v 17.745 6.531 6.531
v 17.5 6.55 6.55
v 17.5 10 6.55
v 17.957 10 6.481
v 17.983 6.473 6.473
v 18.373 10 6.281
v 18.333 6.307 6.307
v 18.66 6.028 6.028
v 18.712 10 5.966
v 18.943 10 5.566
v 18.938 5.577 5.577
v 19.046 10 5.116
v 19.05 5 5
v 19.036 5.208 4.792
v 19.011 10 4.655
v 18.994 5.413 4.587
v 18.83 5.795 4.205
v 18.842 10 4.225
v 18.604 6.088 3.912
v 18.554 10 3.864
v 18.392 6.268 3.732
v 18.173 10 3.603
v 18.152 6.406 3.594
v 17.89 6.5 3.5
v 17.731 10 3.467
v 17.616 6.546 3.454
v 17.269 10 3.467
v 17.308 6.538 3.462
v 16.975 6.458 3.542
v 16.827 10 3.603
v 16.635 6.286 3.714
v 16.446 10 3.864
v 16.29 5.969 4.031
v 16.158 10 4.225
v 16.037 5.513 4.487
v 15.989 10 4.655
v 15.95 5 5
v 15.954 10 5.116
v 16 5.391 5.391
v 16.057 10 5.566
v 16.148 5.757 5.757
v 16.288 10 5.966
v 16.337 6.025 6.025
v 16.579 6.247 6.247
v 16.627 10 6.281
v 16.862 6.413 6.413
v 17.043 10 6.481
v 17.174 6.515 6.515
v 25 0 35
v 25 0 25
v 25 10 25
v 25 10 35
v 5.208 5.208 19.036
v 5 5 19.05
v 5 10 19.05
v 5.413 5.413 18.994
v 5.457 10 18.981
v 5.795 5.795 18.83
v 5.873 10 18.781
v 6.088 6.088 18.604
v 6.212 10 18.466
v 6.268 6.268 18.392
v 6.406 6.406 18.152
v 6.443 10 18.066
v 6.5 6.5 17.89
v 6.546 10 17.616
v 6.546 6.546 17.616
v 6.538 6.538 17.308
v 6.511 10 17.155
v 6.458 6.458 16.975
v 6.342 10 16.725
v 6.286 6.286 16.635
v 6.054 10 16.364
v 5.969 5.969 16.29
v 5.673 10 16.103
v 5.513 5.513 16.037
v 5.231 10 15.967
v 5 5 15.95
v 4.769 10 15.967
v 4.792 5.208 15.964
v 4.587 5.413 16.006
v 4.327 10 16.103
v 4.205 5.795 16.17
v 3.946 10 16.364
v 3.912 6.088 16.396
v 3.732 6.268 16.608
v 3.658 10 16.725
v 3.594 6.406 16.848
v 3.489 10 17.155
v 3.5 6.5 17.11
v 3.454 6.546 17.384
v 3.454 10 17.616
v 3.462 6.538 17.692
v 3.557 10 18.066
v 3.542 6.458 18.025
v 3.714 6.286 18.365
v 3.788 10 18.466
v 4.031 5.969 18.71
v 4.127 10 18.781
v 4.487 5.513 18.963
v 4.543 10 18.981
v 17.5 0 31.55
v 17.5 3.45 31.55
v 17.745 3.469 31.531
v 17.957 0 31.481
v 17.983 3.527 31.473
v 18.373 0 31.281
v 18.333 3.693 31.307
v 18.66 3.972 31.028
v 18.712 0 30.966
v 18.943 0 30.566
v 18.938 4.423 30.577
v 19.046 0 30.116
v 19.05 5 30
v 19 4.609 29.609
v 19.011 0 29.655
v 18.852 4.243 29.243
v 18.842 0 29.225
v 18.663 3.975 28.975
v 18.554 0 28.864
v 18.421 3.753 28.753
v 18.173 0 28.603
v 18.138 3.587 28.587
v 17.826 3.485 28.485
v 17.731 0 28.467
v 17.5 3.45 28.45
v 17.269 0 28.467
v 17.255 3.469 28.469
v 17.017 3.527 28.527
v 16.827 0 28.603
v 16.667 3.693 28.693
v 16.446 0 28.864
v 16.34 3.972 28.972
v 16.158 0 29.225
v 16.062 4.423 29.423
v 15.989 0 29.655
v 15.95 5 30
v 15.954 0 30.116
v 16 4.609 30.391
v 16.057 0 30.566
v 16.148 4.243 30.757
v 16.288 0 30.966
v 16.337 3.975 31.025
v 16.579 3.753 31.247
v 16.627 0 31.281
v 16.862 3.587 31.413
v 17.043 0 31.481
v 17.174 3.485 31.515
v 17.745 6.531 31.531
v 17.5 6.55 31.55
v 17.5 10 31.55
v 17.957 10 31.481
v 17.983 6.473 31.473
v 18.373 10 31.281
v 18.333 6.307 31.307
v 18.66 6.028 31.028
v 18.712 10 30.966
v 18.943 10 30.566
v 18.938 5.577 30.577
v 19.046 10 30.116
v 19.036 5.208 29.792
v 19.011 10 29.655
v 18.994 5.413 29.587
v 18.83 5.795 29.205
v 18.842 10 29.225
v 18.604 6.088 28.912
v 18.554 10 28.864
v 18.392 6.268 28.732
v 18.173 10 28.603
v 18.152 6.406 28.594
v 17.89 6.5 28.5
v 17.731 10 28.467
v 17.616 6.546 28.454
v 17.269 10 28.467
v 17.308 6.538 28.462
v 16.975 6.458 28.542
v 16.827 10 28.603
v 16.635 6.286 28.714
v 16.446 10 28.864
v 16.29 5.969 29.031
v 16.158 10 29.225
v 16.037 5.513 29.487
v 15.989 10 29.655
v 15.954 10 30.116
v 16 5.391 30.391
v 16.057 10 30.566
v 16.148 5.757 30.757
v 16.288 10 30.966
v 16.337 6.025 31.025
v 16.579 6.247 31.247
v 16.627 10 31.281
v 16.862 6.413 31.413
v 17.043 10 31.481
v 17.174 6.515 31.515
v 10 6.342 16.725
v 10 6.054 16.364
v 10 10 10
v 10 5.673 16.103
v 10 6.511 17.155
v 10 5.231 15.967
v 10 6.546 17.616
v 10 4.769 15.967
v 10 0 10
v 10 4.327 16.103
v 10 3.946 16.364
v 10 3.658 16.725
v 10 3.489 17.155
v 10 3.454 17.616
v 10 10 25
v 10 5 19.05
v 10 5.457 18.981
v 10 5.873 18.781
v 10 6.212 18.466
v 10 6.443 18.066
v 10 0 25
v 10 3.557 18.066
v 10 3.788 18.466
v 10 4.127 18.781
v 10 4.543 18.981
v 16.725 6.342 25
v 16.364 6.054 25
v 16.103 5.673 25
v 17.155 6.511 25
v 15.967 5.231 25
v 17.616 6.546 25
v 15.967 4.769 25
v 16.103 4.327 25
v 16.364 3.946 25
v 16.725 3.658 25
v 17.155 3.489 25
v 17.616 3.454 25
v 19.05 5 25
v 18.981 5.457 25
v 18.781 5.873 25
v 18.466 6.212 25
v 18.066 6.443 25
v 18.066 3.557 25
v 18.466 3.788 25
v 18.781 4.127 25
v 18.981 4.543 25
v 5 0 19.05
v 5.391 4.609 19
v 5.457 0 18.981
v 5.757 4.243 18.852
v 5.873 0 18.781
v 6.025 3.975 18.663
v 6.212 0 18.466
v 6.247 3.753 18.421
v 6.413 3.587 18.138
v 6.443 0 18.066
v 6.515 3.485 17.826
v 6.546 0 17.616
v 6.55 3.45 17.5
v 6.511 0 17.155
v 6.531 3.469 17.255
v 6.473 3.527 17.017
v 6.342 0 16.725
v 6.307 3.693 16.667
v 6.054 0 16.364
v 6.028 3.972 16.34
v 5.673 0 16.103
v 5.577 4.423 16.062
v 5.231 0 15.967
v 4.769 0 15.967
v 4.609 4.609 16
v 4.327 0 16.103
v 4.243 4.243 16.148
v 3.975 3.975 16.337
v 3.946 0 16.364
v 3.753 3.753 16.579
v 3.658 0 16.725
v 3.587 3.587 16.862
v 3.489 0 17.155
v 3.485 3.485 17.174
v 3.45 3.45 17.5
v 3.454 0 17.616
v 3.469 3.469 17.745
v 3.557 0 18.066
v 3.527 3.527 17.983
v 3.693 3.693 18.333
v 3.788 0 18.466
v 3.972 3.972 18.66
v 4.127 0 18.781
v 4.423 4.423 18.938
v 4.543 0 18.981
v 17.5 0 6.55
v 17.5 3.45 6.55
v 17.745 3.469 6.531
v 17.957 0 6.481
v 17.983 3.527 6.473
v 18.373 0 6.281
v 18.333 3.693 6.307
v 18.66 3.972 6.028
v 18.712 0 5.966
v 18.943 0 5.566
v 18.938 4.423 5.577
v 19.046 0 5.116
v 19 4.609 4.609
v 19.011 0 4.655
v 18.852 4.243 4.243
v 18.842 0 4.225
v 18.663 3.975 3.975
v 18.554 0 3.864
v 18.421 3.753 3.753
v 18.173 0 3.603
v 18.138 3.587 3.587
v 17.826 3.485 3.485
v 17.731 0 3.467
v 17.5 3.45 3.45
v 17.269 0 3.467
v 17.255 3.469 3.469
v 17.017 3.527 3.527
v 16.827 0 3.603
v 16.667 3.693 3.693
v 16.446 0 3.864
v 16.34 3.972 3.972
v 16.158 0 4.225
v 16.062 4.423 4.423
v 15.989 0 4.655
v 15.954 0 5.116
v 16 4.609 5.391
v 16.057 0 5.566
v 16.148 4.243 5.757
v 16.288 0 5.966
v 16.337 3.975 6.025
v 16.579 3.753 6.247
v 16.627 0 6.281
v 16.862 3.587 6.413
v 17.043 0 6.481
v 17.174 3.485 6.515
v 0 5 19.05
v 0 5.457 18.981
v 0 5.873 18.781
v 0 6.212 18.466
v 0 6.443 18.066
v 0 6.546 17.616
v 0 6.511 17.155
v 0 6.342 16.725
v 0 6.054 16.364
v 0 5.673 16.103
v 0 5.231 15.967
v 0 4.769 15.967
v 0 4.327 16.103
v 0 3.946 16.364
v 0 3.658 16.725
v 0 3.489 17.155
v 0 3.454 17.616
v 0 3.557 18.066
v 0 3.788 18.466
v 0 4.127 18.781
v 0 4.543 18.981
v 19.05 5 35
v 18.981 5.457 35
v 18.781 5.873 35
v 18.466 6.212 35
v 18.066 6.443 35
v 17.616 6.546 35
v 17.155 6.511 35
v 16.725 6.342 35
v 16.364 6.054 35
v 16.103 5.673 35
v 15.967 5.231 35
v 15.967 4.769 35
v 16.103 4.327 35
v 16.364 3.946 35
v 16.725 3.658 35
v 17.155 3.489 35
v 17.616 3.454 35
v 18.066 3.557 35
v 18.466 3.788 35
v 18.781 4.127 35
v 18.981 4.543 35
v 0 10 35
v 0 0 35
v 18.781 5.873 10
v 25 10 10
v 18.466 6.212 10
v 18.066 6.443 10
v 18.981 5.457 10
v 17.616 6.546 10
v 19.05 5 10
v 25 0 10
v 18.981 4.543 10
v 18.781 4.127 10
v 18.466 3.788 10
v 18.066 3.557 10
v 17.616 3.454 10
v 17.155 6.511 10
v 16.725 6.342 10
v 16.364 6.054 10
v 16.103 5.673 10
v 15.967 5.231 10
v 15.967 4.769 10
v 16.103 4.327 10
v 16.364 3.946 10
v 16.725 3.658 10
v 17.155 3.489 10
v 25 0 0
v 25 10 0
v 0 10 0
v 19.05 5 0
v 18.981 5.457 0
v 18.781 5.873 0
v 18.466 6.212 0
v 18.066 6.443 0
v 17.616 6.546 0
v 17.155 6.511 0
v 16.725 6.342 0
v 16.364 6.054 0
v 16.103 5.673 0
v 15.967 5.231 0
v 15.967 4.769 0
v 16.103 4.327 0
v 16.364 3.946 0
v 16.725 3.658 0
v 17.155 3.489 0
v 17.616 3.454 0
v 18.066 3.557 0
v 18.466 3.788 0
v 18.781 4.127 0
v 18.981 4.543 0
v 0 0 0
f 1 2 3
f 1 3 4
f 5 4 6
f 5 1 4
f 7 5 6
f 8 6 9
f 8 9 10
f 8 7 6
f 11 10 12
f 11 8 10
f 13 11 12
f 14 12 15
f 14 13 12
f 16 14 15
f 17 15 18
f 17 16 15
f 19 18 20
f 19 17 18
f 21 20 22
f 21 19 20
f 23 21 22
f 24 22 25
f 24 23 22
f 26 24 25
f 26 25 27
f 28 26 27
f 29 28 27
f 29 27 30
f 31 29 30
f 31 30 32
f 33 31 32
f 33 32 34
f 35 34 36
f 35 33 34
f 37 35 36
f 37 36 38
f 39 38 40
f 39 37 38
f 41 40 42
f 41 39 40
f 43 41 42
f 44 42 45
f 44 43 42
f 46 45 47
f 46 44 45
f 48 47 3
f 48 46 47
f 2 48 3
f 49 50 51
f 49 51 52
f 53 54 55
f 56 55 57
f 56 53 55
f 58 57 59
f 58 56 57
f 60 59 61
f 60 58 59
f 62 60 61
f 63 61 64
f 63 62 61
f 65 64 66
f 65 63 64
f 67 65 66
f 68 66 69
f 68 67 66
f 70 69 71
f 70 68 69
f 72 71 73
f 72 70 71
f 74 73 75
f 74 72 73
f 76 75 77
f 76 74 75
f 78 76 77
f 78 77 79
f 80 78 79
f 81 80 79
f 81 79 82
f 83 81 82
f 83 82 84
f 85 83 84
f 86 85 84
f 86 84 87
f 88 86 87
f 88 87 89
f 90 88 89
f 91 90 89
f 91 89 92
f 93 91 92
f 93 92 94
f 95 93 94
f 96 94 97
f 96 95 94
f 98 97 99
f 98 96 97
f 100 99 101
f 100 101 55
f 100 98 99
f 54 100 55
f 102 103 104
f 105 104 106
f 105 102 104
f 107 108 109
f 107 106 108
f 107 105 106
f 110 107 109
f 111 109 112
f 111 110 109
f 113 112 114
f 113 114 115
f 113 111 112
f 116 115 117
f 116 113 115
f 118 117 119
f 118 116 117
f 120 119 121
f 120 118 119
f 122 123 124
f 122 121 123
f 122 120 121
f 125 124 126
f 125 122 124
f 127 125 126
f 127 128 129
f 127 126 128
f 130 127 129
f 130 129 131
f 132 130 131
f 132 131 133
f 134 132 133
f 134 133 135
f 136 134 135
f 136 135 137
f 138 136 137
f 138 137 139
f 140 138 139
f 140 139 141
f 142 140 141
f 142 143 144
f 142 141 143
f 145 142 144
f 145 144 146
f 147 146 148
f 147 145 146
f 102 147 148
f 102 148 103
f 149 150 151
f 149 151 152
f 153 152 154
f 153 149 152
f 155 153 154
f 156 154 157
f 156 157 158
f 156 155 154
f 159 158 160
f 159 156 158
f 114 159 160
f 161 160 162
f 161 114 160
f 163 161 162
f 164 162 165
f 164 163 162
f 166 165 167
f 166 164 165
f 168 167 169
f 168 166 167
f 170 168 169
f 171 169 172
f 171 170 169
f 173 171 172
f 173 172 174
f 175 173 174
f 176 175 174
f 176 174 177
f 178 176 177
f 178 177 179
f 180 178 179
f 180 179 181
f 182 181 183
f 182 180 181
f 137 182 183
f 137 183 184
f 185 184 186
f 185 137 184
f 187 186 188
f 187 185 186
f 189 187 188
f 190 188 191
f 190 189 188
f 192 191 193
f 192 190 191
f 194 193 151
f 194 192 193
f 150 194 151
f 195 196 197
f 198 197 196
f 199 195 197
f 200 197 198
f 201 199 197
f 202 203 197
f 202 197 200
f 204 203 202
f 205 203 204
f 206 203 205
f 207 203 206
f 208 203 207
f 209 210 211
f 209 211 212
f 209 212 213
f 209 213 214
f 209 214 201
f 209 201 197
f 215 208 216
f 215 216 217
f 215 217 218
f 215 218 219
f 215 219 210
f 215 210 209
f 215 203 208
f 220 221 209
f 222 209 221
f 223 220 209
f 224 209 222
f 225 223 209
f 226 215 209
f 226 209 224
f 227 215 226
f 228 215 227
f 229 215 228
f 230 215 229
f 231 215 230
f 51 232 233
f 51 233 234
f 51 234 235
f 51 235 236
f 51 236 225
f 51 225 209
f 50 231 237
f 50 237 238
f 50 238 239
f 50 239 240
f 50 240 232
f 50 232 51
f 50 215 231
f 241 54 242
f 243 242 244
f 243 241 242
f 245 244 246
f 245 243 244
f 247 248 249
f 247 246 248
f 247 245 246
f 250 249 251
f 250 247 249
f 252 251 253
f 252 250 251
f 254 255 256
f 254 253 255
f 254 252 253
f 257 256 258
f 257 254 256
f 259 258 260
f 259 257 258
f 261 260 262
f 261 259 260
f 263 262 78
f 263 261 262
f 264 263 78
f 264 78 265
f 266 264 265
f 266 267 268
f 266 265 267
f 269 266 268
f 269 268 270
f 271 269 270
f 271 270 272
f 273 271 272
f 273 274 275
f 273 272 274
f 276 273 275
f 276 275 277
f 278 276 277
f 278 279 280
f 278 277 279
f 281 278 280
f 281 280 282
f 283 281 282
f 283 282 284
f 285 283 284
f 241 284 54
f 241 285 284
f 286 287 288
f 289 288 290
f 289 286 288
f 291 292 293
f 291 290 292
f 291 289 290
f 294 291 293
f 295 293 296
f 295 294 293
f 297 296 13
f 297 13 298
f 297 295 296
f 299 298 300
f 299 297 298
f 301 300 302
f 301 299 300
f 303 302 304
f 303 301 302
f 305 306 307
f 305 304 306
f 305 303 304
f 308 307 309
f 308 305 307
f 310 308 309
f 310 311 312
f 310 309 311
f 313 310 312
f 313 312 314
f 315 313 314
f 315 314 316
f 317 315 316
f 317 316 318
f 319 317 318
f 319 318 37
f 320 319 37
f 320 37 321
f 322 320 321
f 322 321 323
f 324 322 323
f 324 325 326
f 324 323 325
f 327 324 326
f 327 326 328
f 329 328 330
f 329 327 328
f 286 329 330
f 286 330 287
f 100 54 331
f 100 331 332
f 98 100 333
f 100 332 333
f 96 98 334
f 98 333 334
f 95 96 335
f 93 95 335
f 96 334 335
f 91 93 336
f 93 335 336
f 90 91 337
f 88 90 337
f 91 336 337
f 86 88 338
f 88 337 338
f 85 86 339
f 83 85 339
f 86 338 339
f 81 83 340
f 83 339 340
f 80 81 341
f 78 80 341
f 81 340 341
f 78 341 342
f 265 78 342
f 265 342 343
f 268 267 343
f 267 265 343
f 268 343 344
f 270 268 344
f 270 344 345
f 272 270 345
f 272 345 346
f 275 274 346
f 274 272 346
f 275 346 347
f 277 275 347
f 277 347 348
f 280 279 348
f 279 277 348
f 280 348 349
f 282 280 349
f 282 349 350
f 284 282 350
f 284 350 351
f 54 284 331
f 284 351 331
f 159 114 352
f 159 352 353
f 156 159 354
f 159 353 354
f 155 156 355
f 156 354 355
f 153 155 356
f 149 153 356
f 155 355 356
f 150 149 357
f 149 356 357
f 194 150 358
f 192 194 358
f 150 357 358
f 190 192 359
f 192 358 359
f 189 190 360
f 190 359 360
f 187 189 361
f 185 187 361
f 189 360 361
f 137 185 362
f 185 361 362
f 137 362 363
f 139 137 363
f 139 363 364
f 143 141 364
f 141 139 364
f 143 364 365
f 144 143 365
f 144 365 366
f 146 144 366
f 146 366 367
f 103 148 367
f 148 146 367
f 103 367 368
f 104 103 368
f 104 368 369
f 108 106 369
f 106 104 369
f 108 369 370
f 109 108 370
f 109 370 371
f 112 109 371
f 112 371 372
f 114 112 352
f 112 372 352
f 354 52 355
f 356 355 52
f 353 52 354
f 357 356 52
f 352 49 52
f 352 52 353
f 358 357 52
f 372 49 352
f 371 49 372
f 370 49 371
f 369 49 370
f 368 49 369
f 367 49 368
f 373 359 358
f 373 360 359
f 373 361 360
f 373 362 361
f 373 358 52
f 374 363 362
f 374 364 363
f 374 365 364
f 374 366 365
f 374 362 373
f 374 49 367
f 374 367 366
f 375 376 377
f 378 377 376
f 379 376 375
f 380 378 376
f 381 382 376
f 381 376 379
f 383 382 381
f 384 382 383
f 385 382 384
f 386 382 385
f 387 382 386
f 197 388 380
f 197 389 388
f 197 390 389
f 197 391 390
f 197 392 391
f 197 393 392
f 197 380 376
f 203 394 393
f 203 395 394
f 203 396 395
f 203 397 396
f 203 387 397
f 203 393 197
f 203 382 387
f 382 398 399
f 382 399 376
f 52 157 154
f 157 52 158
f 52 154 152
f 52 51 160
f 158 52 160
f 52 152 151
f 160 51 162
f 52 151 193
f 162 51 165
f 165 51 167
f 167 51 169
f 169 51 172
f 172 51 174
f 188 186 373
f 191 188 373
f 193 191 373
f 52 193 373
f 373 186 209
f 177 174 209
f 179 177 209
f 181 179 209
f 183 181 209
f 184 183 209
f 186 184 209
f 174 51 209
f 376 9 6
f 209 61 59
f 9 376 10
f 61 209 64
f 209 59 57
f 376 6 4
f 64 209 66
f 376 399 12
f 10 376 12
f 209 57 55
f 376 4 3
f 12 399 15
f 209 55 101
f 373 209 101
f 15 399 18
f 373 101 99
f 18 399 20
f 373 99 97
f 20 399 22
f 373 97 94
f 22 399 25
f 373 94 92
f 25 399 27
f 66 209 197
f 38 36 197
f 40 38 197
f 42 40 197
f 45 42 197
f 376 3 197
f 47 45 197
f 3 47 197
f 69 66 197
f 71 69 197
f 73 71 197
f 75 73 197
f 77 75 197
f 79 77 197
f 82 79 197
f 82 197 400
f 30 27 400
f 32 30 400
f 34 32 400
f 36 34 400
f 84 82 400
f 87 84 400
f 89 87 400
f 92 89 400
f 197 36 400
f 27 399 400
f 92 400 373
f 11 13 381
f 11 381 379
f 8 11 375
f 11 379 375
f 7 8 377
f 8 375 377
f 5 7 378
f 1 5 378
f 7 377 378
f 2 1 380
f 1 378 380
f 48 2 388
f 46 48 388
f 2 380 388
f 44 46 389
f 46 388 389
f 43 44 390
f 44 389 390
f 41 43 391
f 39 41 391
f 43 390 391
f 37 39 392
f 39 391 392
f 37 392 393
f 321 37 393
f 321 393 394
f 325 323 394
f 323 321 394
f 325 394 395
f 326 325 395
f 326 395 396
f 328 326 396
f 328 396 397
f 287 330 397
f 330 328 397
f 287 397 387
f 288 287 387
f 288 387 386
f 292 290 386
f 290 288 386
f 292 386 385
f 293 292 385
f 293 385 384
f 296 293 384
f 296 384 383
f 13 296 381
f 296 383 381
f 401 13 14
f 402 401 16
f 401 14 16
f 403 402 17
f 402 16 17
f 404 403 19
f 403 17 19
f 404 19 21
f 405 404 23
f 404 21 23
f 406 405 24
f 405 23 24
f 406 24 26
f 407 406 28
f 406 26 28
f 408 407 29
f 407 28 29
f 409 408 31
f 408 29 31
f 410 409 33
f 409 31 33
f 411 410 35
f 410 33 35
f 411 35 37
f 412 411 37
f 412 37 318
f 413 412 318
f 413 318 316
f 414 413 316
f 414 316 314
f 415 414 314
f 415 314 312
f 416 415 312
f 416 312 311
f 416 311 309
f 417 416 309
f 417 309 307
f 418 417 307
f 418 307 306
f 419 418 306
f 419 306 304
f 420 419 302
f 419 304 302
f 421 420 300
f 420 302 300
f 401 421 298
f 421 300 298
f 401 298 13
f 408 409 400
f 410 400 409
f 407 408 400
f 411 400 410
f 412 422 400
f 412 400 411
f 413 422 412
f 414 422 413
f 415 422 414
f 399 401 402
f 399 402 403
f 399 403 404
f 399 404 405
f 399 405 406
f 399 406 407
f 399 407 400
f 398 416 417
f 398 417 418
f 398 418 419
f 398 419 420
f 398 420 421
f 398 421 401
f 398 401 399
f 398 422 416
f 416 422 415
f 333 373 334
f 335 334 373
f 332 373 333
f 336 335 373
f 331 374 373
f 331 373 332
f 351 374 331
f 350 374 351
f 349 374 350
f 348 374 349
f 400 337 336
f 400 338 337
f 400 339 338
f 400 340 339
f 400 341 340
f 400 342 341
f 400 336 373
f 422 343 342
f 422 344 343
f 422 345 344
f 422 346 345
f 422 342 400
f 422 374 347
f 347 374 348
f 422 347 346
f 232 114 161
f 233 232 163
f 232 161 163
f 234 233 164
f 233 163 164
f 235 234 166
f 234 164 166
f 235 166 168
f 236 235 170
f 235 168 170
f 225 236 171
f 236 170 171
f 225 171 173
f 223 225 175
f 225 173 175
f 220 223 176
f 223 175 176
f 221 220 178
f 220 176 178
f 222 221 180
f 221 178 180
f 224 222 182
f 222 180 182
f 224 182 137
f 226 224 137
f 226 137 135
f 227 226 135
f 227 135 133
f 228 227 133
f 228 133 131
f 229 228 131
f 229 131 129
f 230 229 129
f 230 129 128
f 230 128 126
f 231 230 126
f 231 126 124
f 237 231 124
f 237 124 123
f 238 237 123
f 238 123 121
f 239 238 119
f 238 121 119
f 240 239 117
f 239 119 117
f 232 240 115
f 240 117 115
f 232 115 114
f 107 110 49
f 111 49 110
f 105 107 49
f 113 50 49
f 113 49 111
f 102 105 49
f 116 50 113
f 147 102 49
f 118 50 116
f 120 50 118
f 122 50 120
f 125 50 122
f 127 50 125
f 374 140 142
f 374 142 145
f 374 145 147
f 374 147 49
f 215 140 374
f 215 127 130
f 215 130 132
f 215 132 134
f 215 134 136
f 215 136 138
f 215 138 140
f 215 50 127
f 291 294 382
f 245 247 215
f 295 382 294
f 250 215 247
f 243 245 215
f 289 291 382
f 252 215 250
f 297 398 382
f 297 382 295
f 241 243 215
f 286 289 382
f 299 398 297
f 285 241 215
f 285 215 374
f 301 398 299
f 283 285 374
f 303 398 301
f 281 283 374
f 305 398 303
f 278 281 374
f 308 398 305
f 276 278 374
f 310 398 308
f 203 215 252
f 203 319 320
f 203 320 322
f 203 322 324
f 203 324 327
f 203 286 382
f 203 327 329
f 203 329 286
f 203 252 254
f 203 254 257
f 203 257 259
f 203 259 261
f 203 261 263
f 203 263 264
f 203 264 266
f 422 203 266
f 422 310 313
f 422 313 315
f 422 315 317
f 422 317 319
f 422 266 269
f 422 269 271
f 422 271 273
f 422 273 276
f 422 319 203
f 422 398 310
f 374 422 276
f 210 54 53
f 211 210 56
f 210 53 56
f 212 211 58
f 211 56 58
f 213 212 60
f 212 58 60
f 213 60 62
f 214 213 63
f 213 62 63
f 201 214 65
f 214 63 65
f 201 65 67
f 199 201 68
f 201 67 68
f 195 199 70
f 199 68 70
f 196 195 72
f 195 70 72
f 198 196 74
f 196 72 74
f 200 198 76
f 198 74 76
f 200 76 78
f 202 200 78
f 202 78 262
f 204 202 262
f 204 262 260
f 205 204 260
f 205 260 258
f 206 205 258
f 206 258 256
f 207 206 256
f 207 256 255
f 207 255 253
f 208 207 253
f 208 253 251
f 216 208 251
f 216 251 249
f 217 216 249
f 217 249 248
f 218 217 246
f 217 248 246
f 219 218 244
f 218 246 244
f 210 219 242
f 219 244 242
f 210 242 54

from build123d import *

# Parameters (mm, degrees)
SKETCH_1_R          = 1.55
EXTRUDE_1_DEPTH     = 10
CUT_EXTRUDE_1_REACH = 46.159
SKETCH_3_R          = 1.55
CUT_EXTRUDE_2_REACH = 46.159
SKETCH_4_R          = 1.55


with BuildPart() as part:
    # 草图1 → 凸台-拉伸1 (new body)
    with BuildSketch(Plane(origin=(0, 0, 0), x_dir=(1, 0, 0), z_dir=(0, 1, 0))):
        Polygon((0, 0), (25, 0), (25, -10), (10, -10), (10, -25), (25, -25), (25, -35), (0, -35), align=None)
        with Locations(Location((5, -17.5, 0), (0, 0, 270))):
            Circle(SKETCH_1_R, mode=Mode.SUBTRACT)
        with Locations(Location((17.5, -5, 0), (0, 0, 270))):
            Circle(SKETCH_1_R, mode=Mode.SUBTRACT)
        with Locations(Location((17.5, -30, 0), (0, 0, 270))):
            Circle(SKETCH_1_R, mode=Mode.SUBTRACT)
    extrude(amount=EXTRUDE_1_DEPTH)

    # 切除-拉伸1: up to this face of the body (flat: up to its plane)
    cut_extrude_1_end = Plane(part.part.faces().sort_by_distance((10, 5, 17.5))[0])
    # 草图3 → 切除-拉伸1 (cut, up to the picked face)
    with BuildSketch(Plane.ZY, mode=Mode.PRIVATE) as cut_extrude_1_sk1:
        with Locations((17.5, 5)):
            Circle(SKETCH_3_R)
    cut_extrude_1_tool1 = split(extrude(cut_extrude_1_sk1.sketch, amount=-CUT_EXTRUDE_1_REACH, mode=Mode.PRIVATE), bisect_by=cut_extrude_1_end, keep=Keep.BOTH, mode=Mode.PRIVATE)
    add(cut_extrude_1_tool1.solids().sort_by(Axis((0, 5, 17.5), (1, 0, 0)))[0], mode=Mode.SUBTRACT)

    # 切除-拉伸2: up to this face of the body (flat: up to its plane)
    cut_extrude_2_end = Plane(part.part.faces().sort_by_distance((12.5, 5, 0))[0])
    # 草图4 → 切除-拉伸2 (cut, up to the picked face)
    with BuildSketch(Plane.XY.offset(35), mode=Mode.PRIVATE) as cut_extrude_2_sk1:
        with Locations((17.5, 5)):
            Circle(SKETCH_4_R)
    cut_extrude_2_tool1 = split(extrude(cut_extrude_2_sk1.sketch, amount=-CUT_EXTRUDE_2_REACH, mode=Mode.PRIVATE), bisect_by=cut_extrude_2_end, keep=Keep.BOTH, mode=Mode.PRIVATE)
    add(cut_extrude_2_tool1.solids().sort_by(Axis((17.5, 5, 35), (0, 0, -1)))[0], mode=Mode.SUBTRACT)


solid = part.part
